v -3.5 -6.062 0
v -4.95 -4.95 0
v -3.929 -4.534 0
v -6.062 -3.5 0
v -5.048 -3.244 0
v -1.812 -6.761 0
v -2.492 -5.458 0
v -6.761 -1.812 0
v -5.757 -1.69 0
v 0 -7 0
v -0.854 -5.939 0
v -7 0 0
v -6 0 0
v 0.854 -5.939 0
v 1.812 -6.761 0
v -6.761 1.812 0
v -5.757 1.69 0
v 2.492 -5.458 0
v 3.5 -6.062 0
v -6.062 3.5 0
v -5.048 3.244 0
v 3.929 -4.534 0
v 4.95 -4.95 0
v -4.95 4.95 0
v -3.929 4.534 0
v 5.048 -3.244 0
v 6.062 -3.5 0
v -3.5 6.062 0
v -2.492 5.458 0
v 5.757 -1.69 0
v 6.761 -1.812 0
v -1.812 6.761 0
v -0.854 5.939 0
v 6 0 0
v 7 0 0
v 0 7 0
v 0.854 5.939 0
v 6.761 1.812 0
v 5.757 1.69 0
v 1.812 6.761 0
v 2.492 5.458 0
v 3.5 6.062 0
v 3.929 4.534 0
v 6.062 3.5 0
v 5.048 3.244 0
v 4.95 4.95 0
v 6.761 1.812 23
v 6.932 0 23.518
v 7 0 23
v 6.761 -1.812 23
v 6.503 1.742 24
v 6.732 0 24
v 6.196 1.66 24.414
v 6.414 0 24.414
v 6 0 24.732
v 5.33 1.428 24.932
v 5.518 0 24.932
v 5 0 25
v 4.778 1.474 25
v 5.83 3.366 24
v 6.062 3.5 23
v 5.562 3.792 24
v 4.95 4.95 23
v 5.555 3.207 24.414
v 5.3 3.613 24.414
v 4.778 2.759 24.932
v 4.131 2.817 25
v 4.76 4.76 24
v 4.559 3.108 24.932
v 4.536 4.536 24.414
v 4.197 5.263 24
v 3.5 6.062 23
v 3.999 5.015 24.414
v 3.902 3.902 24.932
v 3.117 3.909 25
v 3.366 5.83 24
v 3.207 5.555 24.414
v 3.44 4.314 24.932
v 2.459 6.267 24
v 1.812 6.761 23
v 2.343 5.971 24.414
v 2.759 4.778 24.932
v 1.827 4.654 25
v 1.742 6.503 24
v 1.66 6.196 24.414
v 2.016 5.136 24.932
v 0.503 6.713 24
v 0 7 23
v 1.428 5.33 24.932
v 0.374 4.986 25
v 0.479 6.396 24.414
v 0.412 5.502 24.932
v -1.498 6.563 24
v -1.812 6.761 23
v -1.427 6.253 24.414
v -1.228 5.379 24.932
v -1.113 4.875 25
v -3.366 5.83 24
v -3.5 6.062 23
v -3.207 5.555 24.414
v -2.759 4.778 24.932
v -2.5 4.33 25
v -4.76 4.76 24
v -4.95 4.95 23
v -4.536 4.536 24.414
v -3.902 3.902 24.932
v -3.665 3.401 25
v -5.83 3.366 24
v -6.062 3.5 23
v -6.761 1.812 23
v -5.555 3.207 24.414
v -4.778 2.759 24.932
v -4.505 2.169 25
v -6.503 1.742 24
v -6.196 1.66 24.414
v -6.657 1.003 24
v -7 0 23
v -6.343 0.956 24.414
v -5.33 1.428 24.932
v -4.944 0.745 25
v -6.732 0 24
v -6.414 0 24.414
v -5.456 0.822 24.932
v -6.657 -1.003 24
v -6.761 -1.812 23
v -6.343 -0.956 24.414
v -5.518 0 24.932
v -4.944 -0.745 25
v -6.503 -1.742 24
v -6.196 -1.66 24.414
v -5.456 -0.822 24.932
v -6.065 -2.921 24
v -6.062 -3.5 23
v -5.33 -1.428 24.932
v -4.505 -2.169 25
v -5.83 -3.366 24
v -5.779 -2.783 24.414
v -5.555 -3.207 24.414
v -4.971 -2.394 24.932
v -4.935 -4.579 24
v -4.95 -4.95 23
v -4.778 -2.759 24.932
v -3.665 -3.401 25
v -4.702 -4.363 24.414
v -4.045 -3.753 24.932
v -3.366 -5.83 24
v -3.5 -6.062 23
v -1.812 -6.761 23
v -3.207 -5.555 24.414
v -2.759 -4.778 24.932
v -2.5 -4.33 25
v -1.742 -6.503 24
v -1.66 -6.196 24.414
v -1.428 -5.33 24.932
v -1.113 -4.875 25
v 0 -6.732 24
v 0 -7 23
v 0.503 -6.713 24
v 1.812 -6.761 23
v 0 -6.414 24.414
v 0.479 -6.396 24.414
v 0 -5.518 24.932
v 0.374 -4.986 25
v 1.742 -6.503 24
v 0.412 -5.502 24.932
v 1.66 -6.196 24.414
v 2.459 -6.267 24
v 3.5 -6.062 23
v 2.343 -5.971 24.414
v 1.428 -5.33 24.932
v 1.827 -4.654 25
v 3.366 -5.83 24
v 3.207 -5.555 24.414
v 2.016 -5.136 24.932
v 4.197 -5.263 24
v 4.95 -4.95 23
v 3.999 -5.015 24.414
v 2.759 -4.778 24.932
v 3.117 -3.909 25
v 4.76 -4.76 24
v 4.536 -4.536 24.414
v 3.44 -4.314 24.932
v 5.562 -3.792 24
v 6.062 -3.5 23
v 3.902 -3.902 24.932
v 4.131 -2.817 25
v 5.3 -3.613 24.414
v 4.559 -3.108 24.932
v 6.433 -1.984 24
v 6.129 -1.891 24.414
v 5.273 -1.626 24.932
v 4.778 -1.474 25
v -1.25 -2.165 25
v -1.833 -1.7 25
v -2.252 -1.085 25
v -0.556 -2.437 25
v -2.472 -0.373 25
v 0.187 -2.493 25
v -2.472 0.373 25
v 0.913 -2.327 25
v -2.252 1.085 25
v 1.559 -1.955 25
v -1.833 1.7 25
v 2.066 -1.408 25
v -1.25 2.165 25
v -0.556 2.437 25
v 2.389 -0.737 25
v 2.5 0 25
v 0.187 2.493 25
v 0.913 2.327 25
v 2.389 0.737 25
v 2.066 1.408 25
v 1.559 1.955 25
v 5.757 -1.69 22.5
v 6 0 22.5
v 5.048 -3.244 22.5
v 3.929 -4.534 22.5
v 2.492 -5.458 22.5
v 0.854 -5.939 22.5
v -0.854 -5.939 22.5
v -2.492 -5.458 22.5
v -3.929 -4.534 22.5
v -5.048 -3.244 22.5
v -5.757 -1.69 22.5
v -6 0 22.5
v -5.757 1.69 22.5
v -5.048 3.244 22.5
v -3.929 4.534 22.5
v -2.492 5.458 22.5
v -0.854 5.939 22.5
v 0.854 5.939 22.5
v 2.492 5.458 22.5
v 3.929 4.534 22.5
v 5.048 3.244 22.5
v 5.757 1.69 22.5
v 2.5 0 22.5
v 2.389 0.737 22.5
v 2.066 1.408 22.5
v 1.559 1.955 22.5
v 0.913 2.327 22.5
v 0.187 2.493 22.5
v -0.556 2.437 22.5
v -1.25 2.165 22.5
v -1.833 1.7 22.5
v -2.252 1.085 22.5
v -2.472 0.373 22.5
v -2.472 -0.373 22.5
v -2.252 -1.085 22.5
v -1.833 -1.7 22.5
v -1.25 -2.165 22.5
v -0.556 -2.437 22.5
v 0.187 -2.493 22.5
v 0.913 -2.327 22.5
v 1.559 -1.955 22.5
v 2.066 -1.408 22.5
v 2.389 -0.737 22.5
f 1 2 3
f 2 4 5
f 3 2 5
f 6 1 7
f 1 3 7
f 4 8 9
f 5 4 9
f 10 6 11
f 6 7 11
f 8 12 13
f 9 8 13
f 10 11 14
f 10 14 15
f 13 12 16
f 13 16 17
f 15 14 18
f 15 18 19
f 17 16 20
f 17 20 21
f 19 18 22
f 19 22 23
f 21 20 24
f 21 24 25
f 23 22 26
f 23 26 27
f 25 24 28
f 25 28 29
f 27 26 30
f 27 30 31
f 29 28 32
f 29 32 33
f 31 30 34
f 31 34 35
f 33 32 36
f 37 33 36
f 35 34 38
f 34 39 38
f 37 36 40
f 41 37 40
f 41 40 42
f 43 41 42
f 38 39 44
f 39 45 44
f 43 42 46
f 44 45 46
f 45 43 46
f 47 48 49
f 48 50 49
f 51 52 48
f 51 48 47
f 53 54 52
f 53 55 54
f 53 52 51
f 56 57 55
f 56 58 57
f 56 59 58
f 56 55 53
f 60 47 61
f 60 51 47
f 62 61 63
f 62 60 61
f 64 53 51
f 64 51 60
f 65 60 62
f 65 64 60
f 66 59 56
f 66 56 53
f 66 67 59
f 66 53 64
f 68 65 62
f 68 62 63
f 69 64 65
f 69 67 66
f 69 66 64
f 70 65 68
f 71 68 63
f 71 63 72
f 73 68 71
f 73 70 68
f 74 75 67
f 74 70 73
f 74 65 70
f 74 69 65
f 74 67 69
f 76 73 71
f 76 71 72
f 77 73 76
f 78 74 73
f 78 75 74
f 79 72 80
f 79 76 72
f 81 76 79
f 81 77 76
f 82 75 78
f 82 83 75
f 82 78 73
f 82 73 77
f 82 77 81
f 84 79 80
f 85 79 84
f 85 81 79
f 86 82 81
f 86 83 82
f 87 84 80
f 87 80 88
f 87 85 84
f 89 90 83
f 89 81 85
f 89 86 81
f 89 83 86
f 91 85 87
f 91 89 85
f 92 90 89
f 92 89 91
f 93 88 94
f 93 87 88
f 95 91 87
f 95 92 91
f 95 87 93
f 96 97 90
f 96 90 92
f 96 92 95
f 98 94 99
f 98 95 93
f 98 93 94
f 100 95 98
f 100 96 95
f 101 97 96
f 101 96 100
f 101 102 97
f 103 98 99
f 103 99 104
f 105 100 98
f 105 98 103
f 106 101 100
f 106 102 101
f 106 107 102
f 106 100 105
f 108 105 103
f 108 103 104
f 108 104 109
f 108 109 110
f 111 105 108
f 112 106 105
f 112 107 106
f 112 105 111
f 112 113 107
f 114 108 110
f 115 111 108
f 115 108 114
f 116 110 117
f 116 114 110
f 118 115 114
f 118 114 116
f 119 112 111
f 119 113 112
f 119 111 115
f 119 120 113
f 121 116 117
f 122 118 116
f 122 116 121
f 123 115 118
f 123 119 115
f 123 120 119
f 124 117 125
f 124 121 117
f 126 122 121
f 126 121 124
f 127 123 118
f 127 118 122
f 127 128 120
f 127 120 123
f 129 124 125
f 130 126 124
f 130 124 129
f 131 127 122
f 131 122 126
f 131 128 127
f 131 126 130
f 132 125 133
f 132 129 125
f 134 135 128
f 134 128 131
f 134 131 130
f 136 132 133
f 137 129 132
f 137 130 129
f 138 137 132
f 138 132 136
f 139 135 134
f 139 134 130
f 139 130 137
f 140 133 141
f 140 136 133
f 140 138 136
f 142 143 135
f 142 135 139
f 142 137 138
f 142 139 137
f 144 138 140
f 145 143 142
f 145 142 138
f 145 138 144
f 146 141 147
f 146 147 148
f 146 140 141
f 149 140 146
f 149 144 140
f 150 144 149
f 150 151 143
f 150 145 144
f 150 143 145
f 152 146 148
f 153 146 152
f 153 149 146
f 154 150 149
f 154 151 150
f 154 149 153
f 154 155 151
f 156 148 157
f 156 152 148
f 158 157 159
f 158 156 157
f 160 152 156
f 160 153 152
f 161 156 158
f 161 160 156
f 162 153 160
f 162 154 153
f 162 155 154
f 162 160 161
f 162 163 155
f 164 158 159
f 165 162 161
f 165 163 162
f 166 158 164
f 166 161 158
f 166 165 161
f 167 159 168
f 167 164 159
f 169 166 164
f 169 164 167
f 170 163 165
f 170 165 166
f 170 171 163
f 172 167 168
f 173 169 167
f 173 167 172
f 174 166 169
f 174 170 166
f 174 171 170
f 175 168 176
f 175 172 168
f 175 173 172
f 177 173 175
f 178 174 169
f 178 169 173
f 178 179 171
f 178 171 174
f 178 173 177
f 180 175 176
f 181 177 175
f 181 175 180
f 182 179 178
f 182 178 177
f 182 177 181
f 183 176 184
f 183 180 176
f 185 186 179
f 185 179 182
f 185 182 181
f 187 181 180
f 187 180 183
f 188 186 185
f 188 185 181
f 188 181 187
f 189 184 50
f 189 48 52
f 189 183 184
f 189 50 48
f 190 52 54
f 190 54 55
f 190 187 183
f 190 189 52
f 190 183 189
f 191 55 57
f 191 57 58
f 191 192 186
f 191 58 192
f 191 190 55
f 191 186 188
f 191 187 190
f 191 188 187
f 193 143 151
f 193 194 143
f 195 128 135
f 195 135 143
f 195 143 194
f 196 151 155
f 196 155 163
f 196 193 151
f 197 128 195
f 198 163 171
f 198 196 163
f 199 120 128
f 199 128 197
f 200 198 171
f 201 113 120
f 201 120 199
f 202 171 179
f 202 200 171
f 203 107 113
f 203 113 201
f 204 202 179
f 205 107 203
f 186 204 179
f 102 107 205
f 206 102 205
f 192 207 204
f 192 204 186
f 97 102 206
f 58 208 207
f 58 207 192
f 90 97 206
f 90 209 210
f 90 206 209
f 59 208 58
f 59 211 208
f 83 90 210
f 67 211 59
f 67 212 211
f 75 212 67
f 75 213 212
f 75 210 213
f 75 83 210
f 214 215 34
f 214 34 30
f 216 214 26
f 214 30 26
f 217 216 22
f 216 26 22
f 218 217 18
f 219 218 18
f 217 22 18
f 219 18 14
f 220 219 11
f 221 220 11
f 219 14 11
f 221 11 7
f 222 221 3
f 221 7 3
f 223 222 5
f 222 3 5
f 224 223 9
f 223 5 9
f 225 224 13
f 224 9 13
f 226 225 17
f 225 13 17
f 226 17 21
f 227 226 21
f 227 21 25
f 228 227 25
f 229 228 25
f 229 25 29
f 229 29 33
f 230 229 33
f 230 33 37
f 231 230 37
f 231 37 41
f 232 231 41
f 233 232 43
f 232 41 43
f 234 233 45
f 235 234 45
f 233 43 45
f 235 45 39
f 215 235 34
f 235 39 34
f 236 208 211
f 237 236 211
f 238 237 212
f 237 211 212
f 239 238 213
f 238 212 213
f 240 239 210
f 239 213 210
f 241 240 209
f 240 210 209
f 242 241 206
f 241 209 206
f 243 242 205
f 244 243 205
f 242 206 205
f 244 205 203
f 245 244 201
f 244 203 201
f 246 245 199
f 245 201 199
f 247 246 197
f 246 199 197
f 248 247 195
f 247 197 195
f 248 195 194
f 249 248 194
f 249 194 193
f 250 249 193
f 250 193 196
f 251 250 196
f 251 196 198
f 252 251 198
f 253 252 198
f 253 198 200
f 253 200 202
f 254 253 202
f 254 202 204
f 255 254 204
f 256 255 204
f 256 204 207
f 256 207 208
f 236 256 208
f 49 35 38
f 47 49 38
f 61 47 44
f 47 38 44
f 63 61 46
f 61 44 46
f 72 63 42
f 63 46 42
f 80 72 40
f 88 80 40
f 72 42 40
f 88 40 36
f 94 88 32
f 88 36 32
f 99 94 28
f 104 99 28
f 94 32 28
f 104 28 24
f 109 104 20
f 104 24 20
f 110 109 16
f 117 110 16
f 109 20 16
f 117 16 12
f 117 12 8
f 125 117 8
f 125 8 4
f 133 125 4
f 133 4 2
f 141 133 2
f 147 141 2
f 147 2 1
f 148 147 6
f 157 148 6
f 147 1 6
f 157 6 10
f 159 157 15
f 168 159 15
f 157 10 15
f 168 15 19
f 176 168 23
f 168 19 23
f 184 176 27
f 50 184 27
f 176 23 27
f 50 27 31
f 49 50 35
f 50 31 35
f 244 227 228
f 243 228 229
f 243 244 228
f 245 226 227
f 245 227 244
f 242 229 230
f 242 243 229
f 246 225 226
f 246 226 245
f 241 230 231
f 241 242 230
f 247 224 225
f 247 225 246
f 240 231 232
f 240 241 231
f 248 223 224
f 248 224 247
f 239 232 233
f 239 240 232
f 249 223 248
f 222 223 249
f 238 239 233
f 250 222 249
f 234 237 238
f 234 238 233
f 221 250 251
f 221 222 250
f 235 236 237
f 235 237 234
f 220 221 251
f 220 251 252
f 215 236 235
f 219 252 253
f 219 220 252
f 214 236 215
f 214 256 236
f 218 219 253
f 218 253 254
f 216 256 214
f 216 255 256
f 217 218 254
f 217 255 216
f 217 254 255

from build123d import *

# Parameters (mm, degrees)
SKETCH_R        = 7
PAD_DEPTH       = 25
SKETCH002_R     = 6
POCKET_DEPTH    = 22.5
SKETCH001_R     = 2.5
POCKET001_DEPTH = 3
FILLET_R        = 2


with BuildPart() as part:
    # Sketch → Pad (new body)
    with BuildSketch(Plane.XY):
        Circle(SKETCH_R)
    extrude(amount=PAD_DEPTH)

    # Sketch002 → Pocket (cut)
    with BuildSketch(Plane(origin=(0, 0, 0), x_dir=(1, 0, 0), z_dir=(0, 0, -1))):
        Circle(SKETCH002_R)
    extrude(amount=-POCKET_DEPTH, mode=Mode.SUBTRACT)

    # Sketch001 (on Face3 of Pad) → Pocket001 (cut)
    with BuildSketch(Plane.XY.offset(25)):
        Circle(SKETCH001_R)
    extrude(amount=-POCKET001_DEPTH, mode=Mode.SUBTRACT)

    # Fillet
    fillet_edges = [part.edges().sort_by_distance(p)[0] for p in [
        (-7, 0, 25),
    ]]
    fillet(fillet_edges, radius=FILLET_R)


solid = part.part
